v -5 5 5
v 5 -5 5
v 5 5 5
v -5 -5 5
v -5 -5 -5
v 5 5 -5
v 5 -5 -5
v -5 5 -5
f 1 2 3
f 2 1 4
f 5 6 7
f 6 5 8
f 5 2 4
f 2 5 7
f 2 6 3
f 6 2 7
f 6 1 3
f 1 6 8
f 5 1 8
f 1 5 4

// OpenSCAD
module m1() { cube(10, center = true); }
module m2() { sphere(7); }
module e();

module c1() {
    children(0);
}

c1() {
    m1();
    m2();
}
